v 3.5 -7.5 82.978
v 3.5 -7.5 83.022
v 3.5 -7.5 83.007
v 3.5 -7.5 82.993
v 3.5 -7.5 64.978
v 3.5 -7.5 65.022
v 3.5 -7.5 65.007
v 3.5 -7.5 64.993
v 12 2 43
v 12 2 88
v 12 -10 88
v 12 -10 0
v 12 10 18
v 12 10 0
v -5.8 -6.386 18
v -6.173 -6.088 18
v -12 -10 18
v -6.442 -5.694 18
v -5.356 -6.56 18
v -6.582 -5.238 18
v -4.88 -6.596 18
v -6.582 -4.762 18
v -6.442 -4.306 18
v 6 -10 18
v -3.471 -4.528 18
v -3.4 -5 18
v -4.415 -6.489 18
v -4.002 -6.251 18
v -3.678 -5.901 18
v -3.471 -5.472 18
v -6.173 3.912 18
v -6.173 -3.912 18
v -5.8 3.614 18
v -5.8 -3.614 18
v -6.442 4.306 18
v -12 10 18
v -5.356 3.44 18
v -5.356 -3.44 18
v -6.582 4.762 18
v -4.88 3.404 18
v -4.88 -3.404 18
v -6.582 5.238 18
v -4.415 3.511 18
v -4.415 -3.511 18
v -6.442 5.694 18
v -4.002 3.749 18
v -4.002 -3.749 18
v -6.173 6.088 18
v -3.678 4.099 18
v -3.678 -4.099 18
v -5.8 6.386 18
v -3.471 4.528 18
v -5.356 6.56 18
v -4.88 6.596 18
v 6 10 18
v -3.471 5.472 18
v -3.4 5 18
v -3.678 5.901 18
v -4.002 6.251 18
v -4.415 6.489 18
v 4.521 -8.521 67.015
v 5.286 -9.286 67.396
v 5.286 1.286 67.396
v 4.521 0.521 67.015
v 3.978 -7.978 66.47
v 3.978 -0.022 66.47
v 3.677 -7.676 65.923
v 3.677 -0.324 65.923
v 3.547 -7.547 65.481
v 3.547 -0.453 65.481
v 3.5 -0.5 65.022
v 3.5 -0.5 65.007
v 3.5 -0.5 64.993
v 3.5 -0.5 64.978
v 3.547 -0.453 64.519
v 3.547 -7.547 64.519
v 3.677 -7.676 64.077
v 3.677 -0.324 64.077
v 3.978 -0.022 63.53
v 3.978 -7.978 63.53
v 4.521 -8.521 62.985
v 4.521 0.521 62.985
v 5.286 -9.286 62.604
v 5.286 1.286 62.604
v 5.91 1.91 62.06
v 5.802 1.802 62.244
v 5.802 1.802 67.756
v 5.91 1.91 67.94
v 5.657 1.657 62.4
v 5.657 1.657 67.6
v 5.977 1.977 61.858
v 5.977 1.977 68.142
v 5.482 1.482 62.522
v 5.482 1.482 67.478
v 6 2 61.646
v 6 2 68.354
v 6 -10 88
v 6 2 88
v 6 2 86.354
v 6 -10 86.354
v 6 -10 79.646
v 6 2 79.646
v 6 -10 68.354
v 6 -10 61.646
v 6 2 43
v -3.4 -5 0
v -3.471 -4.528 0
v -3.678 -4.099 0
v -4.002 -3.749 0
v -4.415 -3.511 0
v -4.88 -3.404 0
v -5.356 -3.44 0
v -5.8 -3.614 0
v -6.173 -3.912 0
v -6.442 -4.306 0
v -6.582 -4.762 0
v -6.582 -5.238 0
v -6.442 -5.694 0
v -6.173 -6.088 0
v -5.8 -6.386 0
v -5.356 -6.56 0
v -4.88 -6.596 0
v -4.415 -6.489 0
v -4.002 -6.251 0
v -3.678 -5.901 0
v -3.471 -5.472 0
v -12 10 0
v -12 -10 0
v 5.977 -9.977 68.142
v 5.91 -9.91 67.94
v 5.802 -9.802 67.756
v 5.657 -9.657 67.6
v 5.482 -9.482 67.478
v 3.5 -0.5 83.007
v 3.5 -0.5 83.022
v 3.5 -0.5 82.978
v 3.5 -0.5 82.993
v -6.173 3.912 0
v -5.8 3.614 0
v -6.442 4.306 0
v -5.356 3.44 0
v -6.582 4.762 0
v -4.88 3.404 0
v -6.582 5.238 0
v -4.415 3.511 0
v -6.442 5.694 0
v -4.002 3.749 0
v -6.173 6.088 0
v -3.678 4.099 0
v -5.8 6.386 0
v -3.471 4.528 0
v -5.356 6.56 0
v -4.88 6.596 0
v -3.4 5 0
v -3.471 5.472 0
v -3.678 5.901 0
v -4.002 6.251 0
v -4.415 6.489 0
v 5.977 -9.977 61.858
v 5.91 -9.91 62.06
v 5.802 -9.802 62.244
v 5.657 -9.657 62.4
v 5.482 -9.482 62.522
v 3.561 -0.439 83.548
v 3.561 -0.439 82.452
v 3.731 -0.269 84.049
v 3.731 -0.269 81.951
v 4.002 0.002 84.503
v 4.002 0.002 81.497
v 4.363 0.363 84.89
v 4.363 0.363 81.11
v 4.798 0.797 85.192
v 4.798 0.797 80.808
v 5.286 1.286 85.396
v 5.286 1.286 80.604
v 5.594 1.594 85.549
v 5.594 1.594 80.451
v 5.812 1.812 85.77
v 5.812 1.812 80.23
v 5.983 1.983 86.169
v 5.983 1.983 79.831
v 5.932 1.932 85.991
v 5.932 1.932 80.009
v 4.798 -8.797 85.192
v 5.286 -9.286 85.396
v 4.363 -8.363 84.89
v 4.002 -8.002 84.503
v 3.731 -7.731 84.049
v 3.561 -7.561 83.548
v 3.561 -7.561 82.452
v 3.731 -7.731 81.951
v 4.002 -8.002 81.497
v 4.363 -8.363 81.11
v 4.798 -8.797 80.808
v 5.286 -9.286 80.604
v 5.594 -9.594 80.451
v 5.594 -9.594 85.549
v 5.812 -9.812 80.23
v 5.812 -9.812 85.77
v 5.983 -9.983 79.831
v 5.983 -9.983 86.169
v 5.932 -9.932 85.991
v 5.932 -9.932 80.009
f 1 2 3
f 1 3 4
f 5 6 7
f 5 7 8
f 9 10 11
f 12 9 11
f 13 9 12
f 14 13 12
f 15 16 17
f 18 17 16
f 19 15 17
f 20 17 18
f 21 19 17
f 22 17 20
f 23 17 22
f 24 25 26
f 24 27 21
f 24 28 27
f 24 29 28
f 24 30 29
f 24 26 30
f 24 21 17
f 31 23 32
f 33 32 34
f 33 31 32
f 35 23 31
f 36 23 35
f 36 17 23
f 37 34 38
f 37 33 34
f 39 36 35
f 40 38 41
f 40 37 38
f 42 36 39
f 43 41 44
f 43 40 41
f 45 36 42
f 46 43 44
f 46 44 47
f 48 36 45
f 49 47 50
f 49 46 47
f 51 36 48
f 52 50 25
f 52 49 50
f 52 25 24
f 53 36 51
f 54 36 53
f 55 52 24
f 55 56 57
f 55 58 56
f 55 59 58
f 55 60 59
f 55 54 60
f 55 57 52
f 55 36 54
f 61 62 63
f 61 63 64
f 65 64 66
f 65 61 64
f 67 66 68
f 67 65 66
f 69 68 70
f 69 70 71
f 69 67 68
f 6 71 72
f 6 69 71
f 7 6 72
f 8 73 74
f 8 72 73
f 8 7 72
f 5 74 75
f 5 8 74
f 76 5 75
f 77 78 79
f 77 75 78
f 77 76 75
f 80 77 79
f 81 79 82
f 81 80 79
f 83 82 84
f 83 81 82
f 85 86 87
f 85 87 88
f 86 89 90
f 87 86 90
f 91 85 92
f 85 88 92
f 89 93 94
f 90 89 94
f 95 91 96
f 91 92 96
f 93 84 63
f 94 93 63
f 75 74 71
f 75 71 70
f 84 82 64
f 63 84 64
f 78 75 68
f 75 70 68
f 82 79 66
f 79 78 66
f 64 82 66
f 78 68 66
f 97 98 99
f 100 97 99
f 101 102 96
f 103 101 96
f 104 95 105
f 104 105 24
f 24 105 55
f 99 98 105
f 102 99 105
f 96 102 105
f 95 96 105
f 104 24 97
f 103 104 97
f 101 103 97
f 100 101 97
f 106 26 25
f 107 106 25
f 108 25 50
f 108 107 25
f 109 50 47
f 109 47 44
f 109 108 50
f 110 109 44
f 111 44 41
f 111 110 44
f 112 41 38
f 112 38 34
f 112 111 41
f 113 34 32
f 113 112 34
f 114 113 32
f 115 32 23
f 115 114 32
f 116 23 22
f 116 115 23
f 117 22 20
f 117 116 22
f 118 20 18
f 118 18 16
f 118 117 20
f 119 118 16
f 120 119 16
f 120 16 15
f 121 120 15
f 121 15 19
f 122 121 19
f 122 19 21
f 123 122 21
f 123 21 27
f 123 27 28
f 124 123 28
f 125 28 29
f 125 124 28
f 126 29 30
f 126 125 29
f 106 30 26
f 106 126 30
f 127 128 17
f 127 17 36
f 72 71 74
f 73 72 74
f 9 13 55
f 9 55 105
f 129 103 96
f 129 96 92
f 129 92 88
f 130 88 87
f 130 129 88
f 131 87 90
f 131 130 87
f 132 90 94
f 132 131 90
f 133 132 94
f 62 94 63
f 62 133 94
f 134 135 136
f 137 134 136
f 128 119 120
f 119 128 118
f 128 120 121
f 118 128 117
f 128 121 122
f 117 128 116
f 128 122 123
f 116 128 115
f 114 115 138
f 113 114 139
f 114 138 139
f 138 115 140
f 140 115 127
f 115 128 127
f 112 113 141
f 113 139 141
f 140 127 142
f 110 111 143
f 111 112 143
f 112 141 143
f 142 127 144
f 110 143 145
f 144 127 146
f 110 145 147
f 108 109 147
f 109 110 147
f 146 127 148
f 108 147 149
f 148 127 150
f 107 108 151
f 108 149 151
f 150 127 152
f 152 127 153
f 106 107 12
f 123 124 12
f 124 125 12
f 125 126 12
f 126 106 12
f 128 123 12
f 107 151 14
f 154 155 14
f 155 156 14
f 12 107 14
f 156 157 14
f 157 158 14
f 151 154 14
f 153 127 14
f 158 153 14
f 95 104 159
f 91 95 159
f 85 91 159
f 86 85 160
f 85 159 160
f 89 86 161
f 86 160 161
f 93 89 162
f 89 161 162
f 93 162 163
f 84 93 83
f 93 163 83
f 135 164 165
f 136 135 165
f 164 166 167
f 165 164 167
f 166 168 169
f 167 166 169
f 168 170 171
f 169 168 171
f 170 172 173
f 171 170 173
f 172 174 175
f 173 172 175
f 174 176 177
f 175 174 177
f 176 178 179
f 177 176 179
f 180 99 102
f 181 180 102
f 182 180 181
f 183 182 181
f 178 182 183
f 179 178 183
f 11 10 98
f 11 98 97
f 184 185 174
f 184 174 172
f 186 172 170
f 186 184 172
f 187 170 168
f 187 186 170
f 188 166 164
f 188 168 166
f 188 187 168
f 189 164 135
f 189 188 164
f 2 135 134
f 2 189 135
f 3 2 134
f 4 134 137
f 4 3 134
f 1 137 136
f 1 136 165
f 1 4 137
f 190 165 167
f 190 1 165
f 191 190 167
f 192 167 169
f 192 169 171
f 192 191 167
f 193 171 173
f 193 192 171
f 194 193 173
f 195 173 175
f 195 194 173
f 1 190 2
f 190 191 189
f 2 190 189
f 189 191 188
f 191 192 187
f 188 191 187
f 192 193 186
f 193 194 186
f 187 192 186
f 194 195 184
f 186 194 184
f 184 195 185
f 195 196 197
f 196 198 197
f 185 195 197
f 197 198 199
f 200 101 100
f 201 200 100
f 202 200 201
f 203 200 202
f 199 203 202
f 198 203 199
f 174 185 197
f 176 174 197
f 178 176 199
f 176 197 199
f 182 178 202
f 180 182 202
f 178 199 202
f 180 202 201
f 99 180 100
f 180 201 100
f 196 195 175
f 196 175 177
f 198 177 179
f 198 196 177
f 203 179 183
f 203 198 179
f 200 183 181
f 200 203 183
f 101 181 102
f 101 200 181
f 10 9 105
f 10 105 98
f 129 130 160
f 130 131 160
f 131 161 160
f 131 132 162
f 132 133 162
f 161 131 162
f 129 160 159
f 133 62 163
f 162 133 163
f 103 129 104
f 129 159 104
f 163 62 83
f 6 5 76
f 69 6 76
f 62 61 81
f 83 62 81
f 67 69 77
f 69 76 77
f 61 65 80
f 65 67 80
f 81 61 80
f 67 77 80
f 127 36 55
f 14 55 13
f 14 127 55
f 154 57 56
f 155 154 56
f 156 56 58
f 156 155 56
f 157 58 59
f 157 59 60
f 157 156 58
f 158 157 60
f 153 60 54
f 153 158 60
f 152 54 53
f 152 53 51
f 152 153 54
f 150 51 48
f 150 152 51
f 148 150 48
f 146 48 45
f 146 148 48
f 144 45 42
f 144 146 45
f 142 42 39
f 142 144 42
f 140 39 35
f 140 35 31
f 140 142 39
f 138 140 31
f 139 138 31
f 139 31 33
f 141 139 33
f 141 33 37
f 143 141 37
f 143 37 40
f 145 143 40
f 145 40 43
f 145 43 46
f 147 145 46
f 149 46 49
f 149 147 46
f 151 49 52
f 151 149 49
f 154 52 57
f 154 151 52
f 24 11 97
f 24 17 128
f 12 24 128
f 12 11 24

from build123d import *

# Parameters (mm, degrees)
SKETCH1_W           = 24
SKETCH1_H           = 20
SKETCH1_R           = 1.6
BOSS_EXTRUDE1_DEPTH = 18
BOSS_EXTRUDE2_DEPTH = 6
SKETCH3_R           = 2.5
BOSS_EXTRUDE3_DEPTH = 7
FILLET1_R           = 1
CHAMFER1_SIZE       = 2.5


with BuildPart() as part:
    # Sketch1 → Boss-Extrude1 (new body)
    with BuildSketch(Plane.XY):
        Rectangle(SKETCH1_W, SKETCH1_H)
        with Locations((-5, 5)):
            Circle(SKETCH1_R, mode=Mode.SUBTRACT)
        with Locations((-5, -5)):
            Circle(SKETCH1_R, mode=Mode.SUBTRACT)
    extrude(amount=BOSS_EXTRUDE1_DEPTH)

    # Sketch2 → Boss-Extrude2 (add)
    with BuildSketch(Plane(origin=(12, 0, 0), x_dir=(0, 0, -1), z_dir=(1, 0, 0))):
        Polygon((-18, -10), (-18, 10), (-43, 2), (-88, 2), (-88, -10), align=None)
    extrude(amount=-BOSS_EXTRUDE2_DEPTH)

    # Sketch3 → Boss-Extrude3 (add)
    with BuildSketch(Plane(origin=(0, -7.5, 0), x_dir=(-1, 0, 0), z_dir=(0, -1, 0))):
        with Locations((-6, -83)):
            Circle(SKETCH3_R)
        with Locations((-6, -65)):
            Circle(SKETCH3_R)
    extrude(amount=-BOSS_EXTRUDE3_DEPTH)

    # Fillet1
    fillet1_edges = [part.edges().sort_by_distance(p)[0] for p in [
        (6, -4, 80.5),
        (6, -4, 85.5),
        (6, -4, 62.5),
        (6, -4, 67.5),
    ]]
    fillet(fillet1_edges, radius=FILLET1_R)

    # Chamfer1
    chamfer1_edges = [part.edges().sort_by_distance(p)[0] for p in [
        (6, -0.5, 83),
    ]]
    chamfer(chamfer1_edges, length=CHAMFER1_SIZE - 0.0001)  # a hair under: the kernel refuses the full size
    chamfer1_2_edges = [part.edges().sort_by_distance(p)[0] for p in [
        (6, -7.5, 83),
    ]]
    chamfer(chamfer1_2_edges, length=CHAMFER1_SIZE - 0.0001)  # a hair under: the kernel refuses the full size
    chamfer1_3_edges = [part.edges().sort_by_distance(p)[0] for p in [
        (6, -0.5, 65),
    ]]
    chamfer(chamfer1_3_edges, length=CHAMFER1_SIZE - 0.0001)  # a hair under: the kernel refuses the full size
    chamfer1_4_edges = [part.edges().sort_by_distance(p)[0] for p in [
        (6, -7.5, 65),
    ]]
    chamfer(chamfer1_4_edges, length=CHAMFER1_SIZE - 0.0001)  # a hair under: the kernel refuses the full size


solid = part.part
